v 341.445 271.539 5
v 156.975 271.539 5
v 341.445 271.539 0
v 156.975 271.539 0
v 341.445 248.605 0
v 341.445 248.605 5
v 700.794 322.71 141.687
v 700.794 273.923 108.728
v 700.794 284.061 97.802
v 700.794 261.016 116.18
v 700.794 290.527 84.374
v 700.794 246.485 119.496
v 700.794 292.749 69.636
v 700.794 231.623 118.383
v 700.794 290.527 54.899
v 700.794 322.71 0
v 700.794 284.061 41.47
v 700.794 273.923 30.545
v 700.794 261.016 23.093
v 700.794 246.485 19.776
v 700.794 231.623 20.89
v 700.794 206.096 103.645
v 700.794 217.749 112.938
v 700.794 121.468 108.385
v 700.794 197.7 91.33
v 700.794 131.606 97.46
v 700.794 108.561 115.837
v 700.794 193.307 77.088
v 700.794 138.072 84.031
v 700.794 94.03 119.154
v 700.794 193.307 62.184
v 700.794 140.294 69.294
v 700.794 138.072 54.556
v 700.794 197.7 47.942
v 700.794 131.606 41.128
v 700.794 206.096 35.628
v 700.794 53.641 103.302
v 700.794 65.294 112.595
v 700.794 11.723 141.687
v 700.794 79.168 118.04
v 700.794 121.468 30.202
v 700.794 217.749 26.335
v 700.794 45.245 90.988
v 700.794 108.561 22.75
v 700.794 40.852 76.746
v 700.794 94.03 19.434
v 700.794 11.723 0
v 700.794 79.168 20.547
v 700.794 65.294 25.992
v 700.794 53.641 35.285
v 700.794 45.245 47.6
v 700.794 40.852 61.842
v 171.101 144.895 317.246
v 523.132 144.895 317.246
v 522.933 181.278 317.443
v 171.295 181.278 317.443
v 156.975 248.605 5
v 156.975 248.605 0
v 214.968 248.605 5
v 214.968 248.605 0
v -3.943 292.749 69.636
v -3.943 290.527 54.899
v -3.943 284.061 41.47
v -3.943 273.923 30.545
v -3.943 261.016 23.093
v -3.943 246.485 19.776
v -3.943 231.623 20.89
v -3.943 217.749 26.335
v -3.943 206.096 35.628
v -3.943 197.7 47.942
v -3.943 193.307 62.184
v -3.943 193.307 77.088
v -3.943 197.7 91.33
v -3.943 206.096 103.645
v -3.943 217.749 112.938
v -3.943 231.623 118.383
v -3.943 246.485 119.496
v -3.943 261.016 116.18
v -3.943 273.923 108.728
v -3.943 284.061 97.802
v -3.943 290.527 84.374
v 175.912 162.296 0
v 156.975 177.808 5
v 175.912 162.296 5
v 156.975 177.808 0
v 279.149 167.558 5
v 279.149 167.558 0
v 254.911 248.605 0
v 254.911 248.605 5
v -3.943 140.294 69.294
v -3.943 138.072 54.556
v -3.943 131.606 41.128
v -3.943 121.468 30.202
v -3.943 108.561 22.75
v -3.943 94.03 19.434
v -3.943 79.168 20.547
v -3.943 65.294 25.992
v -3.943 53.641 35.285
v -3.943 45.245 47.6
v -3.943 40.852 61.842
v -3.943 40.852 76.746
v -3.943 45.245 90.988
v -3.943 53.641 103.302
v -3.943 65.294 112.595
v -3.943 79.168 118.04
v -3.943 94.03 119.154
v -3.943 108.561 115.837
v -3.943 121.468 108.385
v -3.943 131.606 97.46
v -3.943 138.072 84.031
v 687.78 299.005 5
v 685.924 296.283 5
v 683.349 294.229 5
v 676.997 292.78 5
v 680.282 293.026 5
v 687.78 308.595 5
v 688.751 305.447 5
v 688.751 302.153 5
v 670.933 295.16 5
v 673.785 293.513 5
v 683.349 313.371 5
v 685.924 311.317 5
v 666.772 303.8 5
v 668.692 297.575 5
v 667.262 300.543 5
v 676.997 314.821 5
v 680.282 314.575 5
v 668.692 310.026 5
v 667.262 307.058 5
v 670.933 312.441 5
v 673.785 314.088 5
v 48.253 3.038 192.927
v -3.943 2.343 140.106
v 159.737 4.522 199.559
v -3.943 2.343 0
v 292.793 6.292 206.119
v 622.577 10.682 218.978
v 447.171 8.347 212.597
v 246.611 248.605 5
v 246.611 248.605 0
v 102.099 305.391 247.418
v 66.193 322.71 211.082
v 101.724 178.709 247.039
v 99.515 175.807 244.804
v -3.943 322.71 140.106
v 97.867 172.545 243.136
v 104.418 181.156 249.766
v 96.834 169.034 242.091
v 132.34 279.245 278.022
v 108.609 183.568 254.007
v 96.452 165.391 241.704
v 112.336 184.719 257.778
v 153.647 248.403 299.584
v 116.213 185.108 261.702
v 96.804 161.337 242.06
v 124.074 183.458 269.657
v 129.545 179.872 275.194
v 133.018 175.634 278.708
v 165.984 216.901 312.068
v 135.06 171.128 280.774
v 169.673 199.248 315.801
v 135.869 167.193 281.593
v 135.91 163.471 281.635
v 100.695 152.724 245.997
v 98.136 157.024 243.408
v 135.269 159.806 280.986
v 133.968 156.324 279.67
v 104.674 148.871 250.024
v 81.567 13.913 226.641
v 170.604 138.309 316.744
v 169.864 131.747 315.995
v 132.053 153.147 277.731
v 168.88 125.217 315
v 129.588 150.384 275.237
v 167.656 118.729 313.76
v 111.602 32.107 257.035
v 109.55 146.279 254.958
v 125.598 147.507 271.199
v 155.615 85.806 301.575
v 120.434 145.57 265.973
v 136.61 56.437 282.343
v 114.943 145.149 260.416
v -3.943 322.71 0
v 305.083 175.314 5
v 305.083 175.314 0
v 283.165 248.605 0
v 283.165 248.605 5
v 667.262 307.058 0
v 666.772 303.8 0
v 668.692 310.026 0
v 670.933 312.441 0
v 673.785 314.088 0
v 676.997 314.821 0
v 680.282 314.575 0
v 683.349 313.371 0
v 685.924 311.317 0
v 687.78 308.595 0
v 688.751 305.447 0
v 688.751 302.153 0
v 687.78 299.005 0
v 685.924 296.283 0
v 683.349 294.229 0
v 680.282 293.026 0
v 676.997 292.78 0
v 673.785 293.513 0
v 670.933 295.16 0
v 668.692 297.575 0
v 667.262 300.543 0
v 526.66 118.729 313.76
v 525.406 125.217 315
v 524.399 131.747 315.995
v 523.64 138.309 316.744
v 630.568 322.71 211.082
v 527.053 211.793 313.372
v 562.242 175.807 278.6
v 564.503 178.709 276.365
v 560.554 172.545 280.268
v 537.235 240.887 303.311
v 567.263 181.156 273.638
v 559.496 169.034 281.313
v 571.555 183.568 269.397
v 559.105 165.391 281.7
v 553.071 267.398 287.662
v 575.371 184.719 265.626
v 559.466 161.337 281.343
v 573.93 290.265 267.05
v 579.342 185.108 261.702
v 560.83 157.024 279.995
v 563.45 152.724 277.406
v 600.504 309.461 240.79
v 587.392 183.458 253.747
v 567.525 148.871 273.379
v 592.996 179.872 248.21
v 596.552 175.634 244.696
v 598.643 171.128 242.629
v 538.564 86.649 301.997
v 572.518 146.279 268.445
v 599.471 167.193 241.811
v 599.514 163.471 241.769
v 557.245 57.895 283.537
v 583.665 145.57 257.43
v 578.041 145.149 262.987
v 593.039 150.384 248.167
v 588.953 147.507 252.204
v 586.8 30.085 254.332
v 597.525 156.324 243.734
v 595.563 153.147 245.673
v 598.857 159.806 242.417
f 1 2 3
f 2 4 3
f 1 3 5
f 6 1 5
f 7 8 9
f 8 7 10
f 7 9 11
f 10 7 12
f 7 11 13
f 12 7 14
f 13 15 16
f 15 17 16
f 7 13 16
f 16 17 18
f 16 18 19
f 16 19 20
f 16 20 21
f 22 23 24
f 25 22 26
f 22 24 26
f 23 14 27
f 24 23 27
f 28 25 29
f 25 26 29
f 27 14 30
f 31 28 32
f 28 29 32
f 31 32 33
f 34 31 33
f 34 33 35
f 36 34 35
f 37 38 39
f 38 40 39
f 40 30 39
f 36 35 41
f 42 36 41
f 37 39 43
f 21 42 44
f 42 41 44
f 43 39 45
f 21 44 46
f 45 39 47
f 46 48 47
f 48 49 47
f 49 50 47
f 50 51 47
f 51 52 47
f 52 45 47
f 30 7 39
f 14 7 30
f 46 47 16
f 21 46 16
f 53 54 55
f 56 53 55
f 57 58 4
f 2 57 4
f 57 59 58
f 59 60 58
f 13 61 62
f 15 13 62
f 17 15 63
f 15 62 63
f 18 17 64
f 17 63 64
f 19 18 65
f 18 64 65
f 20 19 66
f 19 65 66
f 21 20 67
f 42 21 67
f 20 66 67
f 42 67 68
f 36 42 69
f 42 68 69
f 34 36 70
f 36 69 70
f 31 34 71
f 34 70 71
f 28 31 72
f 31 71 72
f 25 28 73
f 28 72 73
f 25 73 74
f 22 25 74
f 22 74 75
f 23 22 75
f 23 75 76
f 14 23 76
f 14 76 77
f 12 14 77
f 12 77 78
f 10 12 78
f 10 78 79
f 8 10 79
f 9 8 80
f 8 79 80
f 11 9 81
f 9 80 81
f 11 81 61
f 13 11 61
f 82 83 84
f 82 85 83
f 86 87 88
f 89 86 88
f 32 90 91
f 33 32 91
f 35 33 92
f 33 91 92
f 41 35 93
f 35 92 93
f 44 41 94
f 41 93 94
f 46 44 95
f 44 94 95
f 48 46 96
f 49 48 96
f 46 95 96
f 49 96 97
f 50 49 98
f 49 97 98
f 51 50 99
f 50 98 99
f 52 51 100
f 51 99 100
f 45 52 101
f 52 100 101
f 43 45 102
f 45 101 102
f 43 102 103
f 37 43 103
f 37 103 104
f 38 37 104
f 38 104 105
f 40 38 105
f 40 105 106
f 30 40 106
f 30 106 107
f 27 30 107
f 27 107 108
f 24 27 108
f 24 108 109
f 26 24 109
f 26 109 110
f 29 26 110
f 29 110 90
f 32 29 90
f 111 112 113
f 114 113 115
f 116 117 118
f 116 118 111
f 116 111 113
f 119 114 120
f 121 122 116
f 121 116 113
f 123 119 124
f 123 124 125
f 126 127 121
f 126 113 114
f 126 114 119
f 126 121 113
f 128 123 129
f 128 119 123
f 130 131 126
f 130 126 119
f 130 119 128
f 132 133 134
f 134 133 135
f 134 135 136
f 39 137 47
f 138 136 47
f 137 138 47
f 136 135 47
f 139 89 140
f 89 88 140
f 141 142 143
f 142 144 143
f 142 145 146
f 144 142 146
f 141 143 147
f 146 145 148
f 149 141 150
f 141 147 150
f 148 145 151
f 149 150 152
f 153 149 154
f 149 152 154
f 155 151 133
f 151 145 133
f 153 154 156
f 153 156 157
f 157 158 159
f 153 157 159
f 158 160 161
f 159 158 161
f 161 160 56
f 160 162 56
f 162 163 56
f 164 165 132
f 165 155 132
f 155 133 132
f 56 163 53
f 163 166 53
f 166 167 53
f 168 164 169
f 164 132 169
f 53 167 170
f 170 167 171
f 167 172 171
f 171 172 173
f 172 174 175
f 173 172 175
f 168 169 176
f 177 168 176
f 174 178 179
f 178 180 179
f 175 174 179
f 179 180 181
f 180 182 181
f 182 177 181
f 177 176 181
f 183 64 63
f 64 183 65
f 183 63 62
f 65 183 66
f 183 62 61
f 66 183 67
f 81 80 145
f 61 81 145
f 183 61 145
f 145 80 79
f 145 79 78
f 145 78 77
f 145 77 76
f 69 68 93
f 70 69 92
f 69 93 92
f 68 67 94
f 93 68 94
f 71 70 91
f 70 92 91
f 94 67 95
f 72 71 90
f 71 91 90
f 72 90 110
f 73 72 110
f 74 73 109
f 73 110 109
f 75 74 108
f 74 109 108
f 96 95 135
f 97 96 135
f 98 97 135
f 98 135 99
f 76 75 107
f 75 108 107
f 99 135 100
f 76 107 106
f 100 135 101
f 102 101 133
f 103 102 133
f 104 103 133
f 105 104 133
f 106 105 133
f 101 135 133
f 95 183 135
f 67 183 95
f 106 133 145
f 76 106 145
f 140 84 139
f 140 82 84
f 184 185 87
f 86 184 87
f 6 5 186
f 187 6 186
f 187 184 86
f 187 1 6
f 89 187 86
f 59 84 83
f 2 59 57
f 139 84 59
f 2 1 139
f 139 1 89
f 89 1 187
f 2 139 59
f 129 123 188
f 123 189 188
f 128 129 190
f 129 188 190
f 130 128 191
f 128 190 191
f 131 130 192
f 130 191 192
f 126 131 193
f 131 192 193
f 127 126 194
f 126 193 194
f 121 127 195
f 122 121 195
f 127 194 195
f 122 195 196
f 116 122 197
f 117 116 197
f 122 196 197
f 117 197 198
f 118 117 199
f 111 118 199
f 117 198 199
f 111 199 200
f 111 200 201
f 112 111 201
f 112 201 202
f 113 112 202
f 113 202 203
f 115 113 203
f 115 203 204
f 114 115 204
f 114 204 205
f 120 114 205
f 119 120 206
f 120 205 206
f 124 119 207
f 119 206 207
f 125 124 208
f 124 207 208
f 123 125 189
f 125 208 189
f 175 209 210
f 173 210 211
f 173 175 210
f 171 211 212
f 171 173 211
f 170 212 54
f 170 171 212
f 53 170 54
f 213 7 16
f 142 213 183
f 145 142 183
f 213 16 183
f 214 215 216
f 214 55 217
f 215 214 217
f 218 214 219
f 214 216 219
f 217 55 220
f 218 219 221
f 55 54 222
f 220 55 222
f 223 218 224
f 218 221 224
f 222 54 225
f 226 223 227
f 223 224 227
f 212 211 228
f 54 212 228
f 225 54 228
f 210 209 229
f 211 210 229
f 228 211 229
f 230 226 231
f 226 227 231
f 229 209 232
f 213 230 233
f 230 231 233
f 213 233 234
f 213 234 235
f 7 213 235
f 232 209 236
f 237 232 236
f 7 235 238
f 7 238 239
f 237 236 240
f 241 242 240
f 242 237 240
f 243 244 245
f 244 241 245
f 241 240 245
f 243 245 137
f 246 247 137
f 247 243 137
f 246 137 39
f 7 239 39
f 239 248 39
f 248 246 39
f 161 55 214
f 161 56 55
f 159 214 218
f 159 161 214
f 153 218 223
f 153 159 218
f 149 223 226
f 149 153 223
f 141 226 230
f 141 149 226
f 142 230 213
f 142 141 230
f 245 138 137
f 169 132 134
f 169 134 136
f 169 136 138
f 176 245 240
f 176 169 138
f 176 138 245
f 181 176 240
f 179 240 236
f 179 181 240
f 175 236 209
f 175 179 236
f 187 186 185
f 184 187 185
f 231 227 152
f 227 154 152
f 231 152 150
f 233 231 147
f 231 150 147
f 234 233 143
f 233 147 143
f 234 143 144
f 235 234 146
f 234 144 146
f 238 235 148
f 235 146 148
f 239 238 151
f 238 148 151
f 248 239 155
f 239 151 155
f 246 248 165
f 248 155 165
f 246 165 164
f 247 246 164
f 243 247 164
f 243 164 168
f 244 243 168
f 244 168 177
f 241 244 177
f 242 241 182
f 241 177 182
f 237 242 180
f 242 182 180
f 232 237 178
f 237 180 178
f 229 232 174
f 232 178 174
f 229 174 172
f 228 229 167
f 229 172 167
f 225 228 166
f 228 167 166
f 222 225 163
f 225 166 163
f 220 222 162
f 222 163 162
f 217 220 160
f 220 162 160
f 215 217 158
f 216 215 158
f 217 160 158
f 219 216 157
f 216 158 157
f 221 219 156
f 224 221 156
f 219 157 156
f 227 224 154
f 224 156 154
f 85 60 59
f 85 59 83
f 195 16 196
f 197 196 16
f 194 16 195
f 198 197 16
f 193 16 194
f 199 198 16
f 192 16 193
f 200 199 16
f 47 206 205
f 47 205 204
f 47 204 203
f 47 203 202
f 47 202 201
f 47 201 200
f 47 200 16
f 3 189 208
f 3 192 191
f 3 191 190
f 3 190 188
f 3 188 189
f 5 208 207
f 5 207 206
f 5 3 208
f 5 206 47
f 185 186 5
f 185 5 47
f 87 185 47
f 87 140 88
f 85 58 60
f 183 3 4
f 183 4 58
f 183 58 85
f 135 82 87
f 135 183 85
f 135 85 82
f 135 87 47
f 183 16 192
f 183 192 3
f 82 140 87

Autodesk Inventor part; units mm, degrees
ref_plane "YZ Plane" through (0, 0, 0) normal (1, 0, 0) x (0, 1, 0)
ref_plane "XZ Plane" through (0, 0, 0) normal (0, 1, 0) x (-1, 0, 0)
ref_plane "XY Plane" through (0, 0, 0) normal (0, 0, 1) x (1, 0, 0)
sketch "Sketch1" plane through (0, 0, 0) normal (1, 0, 0) x (0, 1, 0)
  line L0 (330.216, 0) -> (0, 0)
  line L1 (0, 0) -> (0, 164.8957)
  arc A0 (118.7293, 313.7601) -> (0, 164.8957) centre (156.123, 162.1567) ccw
  arc A1 (144.8949, 317.2465) -> (118.7293, 313.7601) centre (154.9782, 141.6407) ccw
  line L2 (144.8949, 317.2465) -> (181.2781, 317.4432)
  arc A2 (330.216, 164.8957) -> (181.2781, 317.4432) centre (176.28, 163.5828) ccw
  line L3 (330.216, 164.8957) -> (330.216, 0)
  line L4 (330.216, 0) -> (0, 0)
  arc A3 (290.5507, 48.5961) -> (284.7281, 100.708) centre (242.7487, 69.6363) ccw
  circle A4 centre (242.7487, 69.6363) radius 50
  arc A5 (57.0662, 113.5176) -> (48.9146, 32.5841) centre (90.2937, 69.2937) ccw
  circle A6 centre (90.2937, 69.2937) radius 50
  circle A7 centre (165.108, 261.7017) radius 20
  dimension "d0" = 100
  dimension "d1" = 100
  dimension "d2" = 40
sketch "Sketch2" plane through (0, 0, 0) normal (0, 1, 0) x (-1, 0, 0)
  line L0 (-2089.1825, 1088.7803) -> (2413.4361, 1088.7803)
  line L1 (2413.4361, 1088.7803) -> (2413.4361, -1008.0732)
  line L2 (2413.4361, -1008.0732) -> (-2089.1825, -1008.0732)
  line L3 (-2089.1825, -1008.0732) -> (-2089.1825, 1088.7803)
  line L4 (-994.3855, 154.3994) -> (-877.0981, 0)
  line L5 (-877.0981, 0) -> (-549.3425, 0)
  line L6 (-549.3425, 0) -> (-549.3425, 138.7482)
  line L7 (-549.3425, 138.7482) -> (-727.3007, 309.2752)
  line L8 (-727.3007, 309.2752) -> (-869.8451, 302.5626)
  line L9 (-869.8451, 302.5626) -> (-881.5787, 366.7057)
  arc A0 (-869.8451, 302.5626) -> (-994.3855, 154.3994) centre (-863.6463, 170.9285) ccw
  line L10 (-172.1358, 318.294) -> (-272.072, 318.294)
  line L11 (-272.072, 318.294) -> (-450.7939, 141.6872)
  line L12 (-450.7939, 141.6872) -> (-450.7939, 0)
  line L13 (-450.7939, 0) -> (3.9431, 0)
  line L14 (3.9431, 0) -> (3.9431, 140.1064)
  line L15 (3.9431, 140.1064) -> (-172.1358, 318.294)
  line L16 (98.5967, 142.2155) -> (98.5967, 0)
  line L17 (98.5967, 0) -> (660.1371, 0)
  line L18 (660.1371, 0) -> (660.1371, 140.1064)
  line L19 (660.1371, 140.1064) -> (484.0582, 318.294)
  line L20 (484.0582, 318.294) -> (276.784, 318.294)
  line L21 (276.784, 318.294) -> (98.5967, 142.2155)
  point P0 (0, 0)
extrude "Extrusion1" add sketch "Sketch1" along normal mid plane 3000
extrude "Extrusion2" cut sketch "Sketch2" along normal mid plane 3000
sketch "Sketch3" plane through (0, 0, 0) normal (0, 0, 1) x (1, 0, 0)
  line L0 (-659.4013, 331.8291) -> (-659.4013, 0)
  line L1 (-659.4013, 0) -> (-101.5785, 2.8306)
  line L2 (-101.5785, 2.8306) -> (-101.5785, 327.2485)
  line L3 (-101.5785, 327.2485) -> (-659.4013, 331.8291)
  line L4 (-6.3615, 322.7102) -> (-6.3615, 2.311)
  line L5 (-6.3615, 2.311) -> (451.0837, 8.3992)
  line L6 (451.0837, 8.3992) -> (451.0837, 322.7102)
  line L7 (451.0837, 322.7102) -> (-6.3615, 322.7102)
  line L8 (550.0381, 321.2751) -> (550.0381, 9.7162)
  line L9 (550.0381, 9.7162) -> (880.8921, 11.9316)
  line L10 (880.8921, 11.9316) -> (881.9732, 8.1918)
  line L11 (550.0381, 321.2751) -> (881.436, 318.556)
  line L12 (881.436, 318.556) -> (884.7001, 327.2485)
  arc A0 (994.4459, 201.1298) -> (881.436, 318.556) centre (879.2692, 203.3778) ccw
  arc A1 (880.8921, 11.9316) -> (994.4459, 129.9671) centre (880.1263, 126.3072) ccw
  line L13 (994.4459, 201.1298) -> (994.4459, 129.9671)
  line L14 (-921.3329, 565.6411) -> (1466.6724, 565.6411)
  line L15 (1466.6724, 565.6411) -> (1466.6724, -337.8722)
  line L16 (1466.6724, -337.8722) -> (-921.3329, -337.8722)
  line L17 (-921.3329, -337.8722) -> (-921.3329, 565.6411)
  point P0 (0, 0)
extrude "Extrusion3" cut sketch "Sketch3" along normal mid plane 3000
chamfer_without_effect "Chamfer1"
sketch "Sketch5" plane through (-659.4013, 0, 0) normal (0, 0, -1) x (-1, 0, 0)
  line L0 (117.9817, -138.9278) -> (-593.002, -138.9278)
  line L1 (-593.002, -138.9278) -> (-593.002, 563.8836)
  line L2 (-593.002, 563.8836) -> (117.9817, 563.8836)
  line L3 (117.9817, 563.8836) -> (117.9817, -138.9278)
  line L4 (-1175.2731, -102.1528) -> (-1759.5873, -102.1528)
  line L5 (-1759.5873, -102.1528) -> (-1759.5873, 529.1516)
  line L6 (-1759.5873, 529.1516) -> (-1175.2731, 529.1516)
  line L7 (-1175.2731, 529.1516) -> (-1175.2731, -102.1528)
  point P0 (-659.4013, 0)
extrude "Extrusion5" cut sketch "Sketch5" along normal mid plane 2000
move faces "Move1" translate (250, 0, 0) faces at (450.7939, 188.0332, 134.0166) (417.0556, 165.298, 175.0262)
sketch "Sketch6" plane through (-3.9431, 2.3432, 0) normal (0, 0, -1) x (-1, 0, 0)
  circle A0 centre (-681.7661, 301.457) radius 11.0515
  line L0 (-704.737, 290.4055) -> (0, 290.4055) projected
  line L1 (-160.9181, 269.1956) -> (-345.3885, 269.1956)
  line L2 (-345.3885, 269.1956) -> (-345.3885, 246.2614)
  line L3 (-345.3885, 246.2614) -> (-160.9181, 246.2614)
  line L4 (-160.9181, 246.2614) -> (-160.9181, 269.1956)
  line L5 (-237.6977, 269.1956) -> (-160.9181, 175.4646)
  line L6 (-160.9181, 175.4646) -> (-179.8547, 159.9527)
  line L7 (-179.8547, 159.9527) -> (-256.6343, 253.6837)
  line L8 (-256.6343, 253.6837) -> (-237.6977, 269.1956)
  line L9 (-256.6343, 253.6837) -> (-282.5689, 261.4396)
  line L10 (-282.5689, 261.4396) -> (-309.0263, 172.9706)
  line L11 (-309.0263, 172.9706) -> (-283.0918, 165.2146)
  line L12 (-283.0918, 165.2146) -> (-256.6343, 253.6837)
  point P0 (-3.9431, -2.3432)
  point P1 (-287.108, 246.2614)
  point P2 (-258.854, 246.2614)
  point P3 (-250.5544, 246.2614)
  point P4 (-218.9112, 246.2614)
extrude "Extrusion6" cut sketch "Sketch6" against normal blind 5
properties part number "Kleiner Finger middle"
